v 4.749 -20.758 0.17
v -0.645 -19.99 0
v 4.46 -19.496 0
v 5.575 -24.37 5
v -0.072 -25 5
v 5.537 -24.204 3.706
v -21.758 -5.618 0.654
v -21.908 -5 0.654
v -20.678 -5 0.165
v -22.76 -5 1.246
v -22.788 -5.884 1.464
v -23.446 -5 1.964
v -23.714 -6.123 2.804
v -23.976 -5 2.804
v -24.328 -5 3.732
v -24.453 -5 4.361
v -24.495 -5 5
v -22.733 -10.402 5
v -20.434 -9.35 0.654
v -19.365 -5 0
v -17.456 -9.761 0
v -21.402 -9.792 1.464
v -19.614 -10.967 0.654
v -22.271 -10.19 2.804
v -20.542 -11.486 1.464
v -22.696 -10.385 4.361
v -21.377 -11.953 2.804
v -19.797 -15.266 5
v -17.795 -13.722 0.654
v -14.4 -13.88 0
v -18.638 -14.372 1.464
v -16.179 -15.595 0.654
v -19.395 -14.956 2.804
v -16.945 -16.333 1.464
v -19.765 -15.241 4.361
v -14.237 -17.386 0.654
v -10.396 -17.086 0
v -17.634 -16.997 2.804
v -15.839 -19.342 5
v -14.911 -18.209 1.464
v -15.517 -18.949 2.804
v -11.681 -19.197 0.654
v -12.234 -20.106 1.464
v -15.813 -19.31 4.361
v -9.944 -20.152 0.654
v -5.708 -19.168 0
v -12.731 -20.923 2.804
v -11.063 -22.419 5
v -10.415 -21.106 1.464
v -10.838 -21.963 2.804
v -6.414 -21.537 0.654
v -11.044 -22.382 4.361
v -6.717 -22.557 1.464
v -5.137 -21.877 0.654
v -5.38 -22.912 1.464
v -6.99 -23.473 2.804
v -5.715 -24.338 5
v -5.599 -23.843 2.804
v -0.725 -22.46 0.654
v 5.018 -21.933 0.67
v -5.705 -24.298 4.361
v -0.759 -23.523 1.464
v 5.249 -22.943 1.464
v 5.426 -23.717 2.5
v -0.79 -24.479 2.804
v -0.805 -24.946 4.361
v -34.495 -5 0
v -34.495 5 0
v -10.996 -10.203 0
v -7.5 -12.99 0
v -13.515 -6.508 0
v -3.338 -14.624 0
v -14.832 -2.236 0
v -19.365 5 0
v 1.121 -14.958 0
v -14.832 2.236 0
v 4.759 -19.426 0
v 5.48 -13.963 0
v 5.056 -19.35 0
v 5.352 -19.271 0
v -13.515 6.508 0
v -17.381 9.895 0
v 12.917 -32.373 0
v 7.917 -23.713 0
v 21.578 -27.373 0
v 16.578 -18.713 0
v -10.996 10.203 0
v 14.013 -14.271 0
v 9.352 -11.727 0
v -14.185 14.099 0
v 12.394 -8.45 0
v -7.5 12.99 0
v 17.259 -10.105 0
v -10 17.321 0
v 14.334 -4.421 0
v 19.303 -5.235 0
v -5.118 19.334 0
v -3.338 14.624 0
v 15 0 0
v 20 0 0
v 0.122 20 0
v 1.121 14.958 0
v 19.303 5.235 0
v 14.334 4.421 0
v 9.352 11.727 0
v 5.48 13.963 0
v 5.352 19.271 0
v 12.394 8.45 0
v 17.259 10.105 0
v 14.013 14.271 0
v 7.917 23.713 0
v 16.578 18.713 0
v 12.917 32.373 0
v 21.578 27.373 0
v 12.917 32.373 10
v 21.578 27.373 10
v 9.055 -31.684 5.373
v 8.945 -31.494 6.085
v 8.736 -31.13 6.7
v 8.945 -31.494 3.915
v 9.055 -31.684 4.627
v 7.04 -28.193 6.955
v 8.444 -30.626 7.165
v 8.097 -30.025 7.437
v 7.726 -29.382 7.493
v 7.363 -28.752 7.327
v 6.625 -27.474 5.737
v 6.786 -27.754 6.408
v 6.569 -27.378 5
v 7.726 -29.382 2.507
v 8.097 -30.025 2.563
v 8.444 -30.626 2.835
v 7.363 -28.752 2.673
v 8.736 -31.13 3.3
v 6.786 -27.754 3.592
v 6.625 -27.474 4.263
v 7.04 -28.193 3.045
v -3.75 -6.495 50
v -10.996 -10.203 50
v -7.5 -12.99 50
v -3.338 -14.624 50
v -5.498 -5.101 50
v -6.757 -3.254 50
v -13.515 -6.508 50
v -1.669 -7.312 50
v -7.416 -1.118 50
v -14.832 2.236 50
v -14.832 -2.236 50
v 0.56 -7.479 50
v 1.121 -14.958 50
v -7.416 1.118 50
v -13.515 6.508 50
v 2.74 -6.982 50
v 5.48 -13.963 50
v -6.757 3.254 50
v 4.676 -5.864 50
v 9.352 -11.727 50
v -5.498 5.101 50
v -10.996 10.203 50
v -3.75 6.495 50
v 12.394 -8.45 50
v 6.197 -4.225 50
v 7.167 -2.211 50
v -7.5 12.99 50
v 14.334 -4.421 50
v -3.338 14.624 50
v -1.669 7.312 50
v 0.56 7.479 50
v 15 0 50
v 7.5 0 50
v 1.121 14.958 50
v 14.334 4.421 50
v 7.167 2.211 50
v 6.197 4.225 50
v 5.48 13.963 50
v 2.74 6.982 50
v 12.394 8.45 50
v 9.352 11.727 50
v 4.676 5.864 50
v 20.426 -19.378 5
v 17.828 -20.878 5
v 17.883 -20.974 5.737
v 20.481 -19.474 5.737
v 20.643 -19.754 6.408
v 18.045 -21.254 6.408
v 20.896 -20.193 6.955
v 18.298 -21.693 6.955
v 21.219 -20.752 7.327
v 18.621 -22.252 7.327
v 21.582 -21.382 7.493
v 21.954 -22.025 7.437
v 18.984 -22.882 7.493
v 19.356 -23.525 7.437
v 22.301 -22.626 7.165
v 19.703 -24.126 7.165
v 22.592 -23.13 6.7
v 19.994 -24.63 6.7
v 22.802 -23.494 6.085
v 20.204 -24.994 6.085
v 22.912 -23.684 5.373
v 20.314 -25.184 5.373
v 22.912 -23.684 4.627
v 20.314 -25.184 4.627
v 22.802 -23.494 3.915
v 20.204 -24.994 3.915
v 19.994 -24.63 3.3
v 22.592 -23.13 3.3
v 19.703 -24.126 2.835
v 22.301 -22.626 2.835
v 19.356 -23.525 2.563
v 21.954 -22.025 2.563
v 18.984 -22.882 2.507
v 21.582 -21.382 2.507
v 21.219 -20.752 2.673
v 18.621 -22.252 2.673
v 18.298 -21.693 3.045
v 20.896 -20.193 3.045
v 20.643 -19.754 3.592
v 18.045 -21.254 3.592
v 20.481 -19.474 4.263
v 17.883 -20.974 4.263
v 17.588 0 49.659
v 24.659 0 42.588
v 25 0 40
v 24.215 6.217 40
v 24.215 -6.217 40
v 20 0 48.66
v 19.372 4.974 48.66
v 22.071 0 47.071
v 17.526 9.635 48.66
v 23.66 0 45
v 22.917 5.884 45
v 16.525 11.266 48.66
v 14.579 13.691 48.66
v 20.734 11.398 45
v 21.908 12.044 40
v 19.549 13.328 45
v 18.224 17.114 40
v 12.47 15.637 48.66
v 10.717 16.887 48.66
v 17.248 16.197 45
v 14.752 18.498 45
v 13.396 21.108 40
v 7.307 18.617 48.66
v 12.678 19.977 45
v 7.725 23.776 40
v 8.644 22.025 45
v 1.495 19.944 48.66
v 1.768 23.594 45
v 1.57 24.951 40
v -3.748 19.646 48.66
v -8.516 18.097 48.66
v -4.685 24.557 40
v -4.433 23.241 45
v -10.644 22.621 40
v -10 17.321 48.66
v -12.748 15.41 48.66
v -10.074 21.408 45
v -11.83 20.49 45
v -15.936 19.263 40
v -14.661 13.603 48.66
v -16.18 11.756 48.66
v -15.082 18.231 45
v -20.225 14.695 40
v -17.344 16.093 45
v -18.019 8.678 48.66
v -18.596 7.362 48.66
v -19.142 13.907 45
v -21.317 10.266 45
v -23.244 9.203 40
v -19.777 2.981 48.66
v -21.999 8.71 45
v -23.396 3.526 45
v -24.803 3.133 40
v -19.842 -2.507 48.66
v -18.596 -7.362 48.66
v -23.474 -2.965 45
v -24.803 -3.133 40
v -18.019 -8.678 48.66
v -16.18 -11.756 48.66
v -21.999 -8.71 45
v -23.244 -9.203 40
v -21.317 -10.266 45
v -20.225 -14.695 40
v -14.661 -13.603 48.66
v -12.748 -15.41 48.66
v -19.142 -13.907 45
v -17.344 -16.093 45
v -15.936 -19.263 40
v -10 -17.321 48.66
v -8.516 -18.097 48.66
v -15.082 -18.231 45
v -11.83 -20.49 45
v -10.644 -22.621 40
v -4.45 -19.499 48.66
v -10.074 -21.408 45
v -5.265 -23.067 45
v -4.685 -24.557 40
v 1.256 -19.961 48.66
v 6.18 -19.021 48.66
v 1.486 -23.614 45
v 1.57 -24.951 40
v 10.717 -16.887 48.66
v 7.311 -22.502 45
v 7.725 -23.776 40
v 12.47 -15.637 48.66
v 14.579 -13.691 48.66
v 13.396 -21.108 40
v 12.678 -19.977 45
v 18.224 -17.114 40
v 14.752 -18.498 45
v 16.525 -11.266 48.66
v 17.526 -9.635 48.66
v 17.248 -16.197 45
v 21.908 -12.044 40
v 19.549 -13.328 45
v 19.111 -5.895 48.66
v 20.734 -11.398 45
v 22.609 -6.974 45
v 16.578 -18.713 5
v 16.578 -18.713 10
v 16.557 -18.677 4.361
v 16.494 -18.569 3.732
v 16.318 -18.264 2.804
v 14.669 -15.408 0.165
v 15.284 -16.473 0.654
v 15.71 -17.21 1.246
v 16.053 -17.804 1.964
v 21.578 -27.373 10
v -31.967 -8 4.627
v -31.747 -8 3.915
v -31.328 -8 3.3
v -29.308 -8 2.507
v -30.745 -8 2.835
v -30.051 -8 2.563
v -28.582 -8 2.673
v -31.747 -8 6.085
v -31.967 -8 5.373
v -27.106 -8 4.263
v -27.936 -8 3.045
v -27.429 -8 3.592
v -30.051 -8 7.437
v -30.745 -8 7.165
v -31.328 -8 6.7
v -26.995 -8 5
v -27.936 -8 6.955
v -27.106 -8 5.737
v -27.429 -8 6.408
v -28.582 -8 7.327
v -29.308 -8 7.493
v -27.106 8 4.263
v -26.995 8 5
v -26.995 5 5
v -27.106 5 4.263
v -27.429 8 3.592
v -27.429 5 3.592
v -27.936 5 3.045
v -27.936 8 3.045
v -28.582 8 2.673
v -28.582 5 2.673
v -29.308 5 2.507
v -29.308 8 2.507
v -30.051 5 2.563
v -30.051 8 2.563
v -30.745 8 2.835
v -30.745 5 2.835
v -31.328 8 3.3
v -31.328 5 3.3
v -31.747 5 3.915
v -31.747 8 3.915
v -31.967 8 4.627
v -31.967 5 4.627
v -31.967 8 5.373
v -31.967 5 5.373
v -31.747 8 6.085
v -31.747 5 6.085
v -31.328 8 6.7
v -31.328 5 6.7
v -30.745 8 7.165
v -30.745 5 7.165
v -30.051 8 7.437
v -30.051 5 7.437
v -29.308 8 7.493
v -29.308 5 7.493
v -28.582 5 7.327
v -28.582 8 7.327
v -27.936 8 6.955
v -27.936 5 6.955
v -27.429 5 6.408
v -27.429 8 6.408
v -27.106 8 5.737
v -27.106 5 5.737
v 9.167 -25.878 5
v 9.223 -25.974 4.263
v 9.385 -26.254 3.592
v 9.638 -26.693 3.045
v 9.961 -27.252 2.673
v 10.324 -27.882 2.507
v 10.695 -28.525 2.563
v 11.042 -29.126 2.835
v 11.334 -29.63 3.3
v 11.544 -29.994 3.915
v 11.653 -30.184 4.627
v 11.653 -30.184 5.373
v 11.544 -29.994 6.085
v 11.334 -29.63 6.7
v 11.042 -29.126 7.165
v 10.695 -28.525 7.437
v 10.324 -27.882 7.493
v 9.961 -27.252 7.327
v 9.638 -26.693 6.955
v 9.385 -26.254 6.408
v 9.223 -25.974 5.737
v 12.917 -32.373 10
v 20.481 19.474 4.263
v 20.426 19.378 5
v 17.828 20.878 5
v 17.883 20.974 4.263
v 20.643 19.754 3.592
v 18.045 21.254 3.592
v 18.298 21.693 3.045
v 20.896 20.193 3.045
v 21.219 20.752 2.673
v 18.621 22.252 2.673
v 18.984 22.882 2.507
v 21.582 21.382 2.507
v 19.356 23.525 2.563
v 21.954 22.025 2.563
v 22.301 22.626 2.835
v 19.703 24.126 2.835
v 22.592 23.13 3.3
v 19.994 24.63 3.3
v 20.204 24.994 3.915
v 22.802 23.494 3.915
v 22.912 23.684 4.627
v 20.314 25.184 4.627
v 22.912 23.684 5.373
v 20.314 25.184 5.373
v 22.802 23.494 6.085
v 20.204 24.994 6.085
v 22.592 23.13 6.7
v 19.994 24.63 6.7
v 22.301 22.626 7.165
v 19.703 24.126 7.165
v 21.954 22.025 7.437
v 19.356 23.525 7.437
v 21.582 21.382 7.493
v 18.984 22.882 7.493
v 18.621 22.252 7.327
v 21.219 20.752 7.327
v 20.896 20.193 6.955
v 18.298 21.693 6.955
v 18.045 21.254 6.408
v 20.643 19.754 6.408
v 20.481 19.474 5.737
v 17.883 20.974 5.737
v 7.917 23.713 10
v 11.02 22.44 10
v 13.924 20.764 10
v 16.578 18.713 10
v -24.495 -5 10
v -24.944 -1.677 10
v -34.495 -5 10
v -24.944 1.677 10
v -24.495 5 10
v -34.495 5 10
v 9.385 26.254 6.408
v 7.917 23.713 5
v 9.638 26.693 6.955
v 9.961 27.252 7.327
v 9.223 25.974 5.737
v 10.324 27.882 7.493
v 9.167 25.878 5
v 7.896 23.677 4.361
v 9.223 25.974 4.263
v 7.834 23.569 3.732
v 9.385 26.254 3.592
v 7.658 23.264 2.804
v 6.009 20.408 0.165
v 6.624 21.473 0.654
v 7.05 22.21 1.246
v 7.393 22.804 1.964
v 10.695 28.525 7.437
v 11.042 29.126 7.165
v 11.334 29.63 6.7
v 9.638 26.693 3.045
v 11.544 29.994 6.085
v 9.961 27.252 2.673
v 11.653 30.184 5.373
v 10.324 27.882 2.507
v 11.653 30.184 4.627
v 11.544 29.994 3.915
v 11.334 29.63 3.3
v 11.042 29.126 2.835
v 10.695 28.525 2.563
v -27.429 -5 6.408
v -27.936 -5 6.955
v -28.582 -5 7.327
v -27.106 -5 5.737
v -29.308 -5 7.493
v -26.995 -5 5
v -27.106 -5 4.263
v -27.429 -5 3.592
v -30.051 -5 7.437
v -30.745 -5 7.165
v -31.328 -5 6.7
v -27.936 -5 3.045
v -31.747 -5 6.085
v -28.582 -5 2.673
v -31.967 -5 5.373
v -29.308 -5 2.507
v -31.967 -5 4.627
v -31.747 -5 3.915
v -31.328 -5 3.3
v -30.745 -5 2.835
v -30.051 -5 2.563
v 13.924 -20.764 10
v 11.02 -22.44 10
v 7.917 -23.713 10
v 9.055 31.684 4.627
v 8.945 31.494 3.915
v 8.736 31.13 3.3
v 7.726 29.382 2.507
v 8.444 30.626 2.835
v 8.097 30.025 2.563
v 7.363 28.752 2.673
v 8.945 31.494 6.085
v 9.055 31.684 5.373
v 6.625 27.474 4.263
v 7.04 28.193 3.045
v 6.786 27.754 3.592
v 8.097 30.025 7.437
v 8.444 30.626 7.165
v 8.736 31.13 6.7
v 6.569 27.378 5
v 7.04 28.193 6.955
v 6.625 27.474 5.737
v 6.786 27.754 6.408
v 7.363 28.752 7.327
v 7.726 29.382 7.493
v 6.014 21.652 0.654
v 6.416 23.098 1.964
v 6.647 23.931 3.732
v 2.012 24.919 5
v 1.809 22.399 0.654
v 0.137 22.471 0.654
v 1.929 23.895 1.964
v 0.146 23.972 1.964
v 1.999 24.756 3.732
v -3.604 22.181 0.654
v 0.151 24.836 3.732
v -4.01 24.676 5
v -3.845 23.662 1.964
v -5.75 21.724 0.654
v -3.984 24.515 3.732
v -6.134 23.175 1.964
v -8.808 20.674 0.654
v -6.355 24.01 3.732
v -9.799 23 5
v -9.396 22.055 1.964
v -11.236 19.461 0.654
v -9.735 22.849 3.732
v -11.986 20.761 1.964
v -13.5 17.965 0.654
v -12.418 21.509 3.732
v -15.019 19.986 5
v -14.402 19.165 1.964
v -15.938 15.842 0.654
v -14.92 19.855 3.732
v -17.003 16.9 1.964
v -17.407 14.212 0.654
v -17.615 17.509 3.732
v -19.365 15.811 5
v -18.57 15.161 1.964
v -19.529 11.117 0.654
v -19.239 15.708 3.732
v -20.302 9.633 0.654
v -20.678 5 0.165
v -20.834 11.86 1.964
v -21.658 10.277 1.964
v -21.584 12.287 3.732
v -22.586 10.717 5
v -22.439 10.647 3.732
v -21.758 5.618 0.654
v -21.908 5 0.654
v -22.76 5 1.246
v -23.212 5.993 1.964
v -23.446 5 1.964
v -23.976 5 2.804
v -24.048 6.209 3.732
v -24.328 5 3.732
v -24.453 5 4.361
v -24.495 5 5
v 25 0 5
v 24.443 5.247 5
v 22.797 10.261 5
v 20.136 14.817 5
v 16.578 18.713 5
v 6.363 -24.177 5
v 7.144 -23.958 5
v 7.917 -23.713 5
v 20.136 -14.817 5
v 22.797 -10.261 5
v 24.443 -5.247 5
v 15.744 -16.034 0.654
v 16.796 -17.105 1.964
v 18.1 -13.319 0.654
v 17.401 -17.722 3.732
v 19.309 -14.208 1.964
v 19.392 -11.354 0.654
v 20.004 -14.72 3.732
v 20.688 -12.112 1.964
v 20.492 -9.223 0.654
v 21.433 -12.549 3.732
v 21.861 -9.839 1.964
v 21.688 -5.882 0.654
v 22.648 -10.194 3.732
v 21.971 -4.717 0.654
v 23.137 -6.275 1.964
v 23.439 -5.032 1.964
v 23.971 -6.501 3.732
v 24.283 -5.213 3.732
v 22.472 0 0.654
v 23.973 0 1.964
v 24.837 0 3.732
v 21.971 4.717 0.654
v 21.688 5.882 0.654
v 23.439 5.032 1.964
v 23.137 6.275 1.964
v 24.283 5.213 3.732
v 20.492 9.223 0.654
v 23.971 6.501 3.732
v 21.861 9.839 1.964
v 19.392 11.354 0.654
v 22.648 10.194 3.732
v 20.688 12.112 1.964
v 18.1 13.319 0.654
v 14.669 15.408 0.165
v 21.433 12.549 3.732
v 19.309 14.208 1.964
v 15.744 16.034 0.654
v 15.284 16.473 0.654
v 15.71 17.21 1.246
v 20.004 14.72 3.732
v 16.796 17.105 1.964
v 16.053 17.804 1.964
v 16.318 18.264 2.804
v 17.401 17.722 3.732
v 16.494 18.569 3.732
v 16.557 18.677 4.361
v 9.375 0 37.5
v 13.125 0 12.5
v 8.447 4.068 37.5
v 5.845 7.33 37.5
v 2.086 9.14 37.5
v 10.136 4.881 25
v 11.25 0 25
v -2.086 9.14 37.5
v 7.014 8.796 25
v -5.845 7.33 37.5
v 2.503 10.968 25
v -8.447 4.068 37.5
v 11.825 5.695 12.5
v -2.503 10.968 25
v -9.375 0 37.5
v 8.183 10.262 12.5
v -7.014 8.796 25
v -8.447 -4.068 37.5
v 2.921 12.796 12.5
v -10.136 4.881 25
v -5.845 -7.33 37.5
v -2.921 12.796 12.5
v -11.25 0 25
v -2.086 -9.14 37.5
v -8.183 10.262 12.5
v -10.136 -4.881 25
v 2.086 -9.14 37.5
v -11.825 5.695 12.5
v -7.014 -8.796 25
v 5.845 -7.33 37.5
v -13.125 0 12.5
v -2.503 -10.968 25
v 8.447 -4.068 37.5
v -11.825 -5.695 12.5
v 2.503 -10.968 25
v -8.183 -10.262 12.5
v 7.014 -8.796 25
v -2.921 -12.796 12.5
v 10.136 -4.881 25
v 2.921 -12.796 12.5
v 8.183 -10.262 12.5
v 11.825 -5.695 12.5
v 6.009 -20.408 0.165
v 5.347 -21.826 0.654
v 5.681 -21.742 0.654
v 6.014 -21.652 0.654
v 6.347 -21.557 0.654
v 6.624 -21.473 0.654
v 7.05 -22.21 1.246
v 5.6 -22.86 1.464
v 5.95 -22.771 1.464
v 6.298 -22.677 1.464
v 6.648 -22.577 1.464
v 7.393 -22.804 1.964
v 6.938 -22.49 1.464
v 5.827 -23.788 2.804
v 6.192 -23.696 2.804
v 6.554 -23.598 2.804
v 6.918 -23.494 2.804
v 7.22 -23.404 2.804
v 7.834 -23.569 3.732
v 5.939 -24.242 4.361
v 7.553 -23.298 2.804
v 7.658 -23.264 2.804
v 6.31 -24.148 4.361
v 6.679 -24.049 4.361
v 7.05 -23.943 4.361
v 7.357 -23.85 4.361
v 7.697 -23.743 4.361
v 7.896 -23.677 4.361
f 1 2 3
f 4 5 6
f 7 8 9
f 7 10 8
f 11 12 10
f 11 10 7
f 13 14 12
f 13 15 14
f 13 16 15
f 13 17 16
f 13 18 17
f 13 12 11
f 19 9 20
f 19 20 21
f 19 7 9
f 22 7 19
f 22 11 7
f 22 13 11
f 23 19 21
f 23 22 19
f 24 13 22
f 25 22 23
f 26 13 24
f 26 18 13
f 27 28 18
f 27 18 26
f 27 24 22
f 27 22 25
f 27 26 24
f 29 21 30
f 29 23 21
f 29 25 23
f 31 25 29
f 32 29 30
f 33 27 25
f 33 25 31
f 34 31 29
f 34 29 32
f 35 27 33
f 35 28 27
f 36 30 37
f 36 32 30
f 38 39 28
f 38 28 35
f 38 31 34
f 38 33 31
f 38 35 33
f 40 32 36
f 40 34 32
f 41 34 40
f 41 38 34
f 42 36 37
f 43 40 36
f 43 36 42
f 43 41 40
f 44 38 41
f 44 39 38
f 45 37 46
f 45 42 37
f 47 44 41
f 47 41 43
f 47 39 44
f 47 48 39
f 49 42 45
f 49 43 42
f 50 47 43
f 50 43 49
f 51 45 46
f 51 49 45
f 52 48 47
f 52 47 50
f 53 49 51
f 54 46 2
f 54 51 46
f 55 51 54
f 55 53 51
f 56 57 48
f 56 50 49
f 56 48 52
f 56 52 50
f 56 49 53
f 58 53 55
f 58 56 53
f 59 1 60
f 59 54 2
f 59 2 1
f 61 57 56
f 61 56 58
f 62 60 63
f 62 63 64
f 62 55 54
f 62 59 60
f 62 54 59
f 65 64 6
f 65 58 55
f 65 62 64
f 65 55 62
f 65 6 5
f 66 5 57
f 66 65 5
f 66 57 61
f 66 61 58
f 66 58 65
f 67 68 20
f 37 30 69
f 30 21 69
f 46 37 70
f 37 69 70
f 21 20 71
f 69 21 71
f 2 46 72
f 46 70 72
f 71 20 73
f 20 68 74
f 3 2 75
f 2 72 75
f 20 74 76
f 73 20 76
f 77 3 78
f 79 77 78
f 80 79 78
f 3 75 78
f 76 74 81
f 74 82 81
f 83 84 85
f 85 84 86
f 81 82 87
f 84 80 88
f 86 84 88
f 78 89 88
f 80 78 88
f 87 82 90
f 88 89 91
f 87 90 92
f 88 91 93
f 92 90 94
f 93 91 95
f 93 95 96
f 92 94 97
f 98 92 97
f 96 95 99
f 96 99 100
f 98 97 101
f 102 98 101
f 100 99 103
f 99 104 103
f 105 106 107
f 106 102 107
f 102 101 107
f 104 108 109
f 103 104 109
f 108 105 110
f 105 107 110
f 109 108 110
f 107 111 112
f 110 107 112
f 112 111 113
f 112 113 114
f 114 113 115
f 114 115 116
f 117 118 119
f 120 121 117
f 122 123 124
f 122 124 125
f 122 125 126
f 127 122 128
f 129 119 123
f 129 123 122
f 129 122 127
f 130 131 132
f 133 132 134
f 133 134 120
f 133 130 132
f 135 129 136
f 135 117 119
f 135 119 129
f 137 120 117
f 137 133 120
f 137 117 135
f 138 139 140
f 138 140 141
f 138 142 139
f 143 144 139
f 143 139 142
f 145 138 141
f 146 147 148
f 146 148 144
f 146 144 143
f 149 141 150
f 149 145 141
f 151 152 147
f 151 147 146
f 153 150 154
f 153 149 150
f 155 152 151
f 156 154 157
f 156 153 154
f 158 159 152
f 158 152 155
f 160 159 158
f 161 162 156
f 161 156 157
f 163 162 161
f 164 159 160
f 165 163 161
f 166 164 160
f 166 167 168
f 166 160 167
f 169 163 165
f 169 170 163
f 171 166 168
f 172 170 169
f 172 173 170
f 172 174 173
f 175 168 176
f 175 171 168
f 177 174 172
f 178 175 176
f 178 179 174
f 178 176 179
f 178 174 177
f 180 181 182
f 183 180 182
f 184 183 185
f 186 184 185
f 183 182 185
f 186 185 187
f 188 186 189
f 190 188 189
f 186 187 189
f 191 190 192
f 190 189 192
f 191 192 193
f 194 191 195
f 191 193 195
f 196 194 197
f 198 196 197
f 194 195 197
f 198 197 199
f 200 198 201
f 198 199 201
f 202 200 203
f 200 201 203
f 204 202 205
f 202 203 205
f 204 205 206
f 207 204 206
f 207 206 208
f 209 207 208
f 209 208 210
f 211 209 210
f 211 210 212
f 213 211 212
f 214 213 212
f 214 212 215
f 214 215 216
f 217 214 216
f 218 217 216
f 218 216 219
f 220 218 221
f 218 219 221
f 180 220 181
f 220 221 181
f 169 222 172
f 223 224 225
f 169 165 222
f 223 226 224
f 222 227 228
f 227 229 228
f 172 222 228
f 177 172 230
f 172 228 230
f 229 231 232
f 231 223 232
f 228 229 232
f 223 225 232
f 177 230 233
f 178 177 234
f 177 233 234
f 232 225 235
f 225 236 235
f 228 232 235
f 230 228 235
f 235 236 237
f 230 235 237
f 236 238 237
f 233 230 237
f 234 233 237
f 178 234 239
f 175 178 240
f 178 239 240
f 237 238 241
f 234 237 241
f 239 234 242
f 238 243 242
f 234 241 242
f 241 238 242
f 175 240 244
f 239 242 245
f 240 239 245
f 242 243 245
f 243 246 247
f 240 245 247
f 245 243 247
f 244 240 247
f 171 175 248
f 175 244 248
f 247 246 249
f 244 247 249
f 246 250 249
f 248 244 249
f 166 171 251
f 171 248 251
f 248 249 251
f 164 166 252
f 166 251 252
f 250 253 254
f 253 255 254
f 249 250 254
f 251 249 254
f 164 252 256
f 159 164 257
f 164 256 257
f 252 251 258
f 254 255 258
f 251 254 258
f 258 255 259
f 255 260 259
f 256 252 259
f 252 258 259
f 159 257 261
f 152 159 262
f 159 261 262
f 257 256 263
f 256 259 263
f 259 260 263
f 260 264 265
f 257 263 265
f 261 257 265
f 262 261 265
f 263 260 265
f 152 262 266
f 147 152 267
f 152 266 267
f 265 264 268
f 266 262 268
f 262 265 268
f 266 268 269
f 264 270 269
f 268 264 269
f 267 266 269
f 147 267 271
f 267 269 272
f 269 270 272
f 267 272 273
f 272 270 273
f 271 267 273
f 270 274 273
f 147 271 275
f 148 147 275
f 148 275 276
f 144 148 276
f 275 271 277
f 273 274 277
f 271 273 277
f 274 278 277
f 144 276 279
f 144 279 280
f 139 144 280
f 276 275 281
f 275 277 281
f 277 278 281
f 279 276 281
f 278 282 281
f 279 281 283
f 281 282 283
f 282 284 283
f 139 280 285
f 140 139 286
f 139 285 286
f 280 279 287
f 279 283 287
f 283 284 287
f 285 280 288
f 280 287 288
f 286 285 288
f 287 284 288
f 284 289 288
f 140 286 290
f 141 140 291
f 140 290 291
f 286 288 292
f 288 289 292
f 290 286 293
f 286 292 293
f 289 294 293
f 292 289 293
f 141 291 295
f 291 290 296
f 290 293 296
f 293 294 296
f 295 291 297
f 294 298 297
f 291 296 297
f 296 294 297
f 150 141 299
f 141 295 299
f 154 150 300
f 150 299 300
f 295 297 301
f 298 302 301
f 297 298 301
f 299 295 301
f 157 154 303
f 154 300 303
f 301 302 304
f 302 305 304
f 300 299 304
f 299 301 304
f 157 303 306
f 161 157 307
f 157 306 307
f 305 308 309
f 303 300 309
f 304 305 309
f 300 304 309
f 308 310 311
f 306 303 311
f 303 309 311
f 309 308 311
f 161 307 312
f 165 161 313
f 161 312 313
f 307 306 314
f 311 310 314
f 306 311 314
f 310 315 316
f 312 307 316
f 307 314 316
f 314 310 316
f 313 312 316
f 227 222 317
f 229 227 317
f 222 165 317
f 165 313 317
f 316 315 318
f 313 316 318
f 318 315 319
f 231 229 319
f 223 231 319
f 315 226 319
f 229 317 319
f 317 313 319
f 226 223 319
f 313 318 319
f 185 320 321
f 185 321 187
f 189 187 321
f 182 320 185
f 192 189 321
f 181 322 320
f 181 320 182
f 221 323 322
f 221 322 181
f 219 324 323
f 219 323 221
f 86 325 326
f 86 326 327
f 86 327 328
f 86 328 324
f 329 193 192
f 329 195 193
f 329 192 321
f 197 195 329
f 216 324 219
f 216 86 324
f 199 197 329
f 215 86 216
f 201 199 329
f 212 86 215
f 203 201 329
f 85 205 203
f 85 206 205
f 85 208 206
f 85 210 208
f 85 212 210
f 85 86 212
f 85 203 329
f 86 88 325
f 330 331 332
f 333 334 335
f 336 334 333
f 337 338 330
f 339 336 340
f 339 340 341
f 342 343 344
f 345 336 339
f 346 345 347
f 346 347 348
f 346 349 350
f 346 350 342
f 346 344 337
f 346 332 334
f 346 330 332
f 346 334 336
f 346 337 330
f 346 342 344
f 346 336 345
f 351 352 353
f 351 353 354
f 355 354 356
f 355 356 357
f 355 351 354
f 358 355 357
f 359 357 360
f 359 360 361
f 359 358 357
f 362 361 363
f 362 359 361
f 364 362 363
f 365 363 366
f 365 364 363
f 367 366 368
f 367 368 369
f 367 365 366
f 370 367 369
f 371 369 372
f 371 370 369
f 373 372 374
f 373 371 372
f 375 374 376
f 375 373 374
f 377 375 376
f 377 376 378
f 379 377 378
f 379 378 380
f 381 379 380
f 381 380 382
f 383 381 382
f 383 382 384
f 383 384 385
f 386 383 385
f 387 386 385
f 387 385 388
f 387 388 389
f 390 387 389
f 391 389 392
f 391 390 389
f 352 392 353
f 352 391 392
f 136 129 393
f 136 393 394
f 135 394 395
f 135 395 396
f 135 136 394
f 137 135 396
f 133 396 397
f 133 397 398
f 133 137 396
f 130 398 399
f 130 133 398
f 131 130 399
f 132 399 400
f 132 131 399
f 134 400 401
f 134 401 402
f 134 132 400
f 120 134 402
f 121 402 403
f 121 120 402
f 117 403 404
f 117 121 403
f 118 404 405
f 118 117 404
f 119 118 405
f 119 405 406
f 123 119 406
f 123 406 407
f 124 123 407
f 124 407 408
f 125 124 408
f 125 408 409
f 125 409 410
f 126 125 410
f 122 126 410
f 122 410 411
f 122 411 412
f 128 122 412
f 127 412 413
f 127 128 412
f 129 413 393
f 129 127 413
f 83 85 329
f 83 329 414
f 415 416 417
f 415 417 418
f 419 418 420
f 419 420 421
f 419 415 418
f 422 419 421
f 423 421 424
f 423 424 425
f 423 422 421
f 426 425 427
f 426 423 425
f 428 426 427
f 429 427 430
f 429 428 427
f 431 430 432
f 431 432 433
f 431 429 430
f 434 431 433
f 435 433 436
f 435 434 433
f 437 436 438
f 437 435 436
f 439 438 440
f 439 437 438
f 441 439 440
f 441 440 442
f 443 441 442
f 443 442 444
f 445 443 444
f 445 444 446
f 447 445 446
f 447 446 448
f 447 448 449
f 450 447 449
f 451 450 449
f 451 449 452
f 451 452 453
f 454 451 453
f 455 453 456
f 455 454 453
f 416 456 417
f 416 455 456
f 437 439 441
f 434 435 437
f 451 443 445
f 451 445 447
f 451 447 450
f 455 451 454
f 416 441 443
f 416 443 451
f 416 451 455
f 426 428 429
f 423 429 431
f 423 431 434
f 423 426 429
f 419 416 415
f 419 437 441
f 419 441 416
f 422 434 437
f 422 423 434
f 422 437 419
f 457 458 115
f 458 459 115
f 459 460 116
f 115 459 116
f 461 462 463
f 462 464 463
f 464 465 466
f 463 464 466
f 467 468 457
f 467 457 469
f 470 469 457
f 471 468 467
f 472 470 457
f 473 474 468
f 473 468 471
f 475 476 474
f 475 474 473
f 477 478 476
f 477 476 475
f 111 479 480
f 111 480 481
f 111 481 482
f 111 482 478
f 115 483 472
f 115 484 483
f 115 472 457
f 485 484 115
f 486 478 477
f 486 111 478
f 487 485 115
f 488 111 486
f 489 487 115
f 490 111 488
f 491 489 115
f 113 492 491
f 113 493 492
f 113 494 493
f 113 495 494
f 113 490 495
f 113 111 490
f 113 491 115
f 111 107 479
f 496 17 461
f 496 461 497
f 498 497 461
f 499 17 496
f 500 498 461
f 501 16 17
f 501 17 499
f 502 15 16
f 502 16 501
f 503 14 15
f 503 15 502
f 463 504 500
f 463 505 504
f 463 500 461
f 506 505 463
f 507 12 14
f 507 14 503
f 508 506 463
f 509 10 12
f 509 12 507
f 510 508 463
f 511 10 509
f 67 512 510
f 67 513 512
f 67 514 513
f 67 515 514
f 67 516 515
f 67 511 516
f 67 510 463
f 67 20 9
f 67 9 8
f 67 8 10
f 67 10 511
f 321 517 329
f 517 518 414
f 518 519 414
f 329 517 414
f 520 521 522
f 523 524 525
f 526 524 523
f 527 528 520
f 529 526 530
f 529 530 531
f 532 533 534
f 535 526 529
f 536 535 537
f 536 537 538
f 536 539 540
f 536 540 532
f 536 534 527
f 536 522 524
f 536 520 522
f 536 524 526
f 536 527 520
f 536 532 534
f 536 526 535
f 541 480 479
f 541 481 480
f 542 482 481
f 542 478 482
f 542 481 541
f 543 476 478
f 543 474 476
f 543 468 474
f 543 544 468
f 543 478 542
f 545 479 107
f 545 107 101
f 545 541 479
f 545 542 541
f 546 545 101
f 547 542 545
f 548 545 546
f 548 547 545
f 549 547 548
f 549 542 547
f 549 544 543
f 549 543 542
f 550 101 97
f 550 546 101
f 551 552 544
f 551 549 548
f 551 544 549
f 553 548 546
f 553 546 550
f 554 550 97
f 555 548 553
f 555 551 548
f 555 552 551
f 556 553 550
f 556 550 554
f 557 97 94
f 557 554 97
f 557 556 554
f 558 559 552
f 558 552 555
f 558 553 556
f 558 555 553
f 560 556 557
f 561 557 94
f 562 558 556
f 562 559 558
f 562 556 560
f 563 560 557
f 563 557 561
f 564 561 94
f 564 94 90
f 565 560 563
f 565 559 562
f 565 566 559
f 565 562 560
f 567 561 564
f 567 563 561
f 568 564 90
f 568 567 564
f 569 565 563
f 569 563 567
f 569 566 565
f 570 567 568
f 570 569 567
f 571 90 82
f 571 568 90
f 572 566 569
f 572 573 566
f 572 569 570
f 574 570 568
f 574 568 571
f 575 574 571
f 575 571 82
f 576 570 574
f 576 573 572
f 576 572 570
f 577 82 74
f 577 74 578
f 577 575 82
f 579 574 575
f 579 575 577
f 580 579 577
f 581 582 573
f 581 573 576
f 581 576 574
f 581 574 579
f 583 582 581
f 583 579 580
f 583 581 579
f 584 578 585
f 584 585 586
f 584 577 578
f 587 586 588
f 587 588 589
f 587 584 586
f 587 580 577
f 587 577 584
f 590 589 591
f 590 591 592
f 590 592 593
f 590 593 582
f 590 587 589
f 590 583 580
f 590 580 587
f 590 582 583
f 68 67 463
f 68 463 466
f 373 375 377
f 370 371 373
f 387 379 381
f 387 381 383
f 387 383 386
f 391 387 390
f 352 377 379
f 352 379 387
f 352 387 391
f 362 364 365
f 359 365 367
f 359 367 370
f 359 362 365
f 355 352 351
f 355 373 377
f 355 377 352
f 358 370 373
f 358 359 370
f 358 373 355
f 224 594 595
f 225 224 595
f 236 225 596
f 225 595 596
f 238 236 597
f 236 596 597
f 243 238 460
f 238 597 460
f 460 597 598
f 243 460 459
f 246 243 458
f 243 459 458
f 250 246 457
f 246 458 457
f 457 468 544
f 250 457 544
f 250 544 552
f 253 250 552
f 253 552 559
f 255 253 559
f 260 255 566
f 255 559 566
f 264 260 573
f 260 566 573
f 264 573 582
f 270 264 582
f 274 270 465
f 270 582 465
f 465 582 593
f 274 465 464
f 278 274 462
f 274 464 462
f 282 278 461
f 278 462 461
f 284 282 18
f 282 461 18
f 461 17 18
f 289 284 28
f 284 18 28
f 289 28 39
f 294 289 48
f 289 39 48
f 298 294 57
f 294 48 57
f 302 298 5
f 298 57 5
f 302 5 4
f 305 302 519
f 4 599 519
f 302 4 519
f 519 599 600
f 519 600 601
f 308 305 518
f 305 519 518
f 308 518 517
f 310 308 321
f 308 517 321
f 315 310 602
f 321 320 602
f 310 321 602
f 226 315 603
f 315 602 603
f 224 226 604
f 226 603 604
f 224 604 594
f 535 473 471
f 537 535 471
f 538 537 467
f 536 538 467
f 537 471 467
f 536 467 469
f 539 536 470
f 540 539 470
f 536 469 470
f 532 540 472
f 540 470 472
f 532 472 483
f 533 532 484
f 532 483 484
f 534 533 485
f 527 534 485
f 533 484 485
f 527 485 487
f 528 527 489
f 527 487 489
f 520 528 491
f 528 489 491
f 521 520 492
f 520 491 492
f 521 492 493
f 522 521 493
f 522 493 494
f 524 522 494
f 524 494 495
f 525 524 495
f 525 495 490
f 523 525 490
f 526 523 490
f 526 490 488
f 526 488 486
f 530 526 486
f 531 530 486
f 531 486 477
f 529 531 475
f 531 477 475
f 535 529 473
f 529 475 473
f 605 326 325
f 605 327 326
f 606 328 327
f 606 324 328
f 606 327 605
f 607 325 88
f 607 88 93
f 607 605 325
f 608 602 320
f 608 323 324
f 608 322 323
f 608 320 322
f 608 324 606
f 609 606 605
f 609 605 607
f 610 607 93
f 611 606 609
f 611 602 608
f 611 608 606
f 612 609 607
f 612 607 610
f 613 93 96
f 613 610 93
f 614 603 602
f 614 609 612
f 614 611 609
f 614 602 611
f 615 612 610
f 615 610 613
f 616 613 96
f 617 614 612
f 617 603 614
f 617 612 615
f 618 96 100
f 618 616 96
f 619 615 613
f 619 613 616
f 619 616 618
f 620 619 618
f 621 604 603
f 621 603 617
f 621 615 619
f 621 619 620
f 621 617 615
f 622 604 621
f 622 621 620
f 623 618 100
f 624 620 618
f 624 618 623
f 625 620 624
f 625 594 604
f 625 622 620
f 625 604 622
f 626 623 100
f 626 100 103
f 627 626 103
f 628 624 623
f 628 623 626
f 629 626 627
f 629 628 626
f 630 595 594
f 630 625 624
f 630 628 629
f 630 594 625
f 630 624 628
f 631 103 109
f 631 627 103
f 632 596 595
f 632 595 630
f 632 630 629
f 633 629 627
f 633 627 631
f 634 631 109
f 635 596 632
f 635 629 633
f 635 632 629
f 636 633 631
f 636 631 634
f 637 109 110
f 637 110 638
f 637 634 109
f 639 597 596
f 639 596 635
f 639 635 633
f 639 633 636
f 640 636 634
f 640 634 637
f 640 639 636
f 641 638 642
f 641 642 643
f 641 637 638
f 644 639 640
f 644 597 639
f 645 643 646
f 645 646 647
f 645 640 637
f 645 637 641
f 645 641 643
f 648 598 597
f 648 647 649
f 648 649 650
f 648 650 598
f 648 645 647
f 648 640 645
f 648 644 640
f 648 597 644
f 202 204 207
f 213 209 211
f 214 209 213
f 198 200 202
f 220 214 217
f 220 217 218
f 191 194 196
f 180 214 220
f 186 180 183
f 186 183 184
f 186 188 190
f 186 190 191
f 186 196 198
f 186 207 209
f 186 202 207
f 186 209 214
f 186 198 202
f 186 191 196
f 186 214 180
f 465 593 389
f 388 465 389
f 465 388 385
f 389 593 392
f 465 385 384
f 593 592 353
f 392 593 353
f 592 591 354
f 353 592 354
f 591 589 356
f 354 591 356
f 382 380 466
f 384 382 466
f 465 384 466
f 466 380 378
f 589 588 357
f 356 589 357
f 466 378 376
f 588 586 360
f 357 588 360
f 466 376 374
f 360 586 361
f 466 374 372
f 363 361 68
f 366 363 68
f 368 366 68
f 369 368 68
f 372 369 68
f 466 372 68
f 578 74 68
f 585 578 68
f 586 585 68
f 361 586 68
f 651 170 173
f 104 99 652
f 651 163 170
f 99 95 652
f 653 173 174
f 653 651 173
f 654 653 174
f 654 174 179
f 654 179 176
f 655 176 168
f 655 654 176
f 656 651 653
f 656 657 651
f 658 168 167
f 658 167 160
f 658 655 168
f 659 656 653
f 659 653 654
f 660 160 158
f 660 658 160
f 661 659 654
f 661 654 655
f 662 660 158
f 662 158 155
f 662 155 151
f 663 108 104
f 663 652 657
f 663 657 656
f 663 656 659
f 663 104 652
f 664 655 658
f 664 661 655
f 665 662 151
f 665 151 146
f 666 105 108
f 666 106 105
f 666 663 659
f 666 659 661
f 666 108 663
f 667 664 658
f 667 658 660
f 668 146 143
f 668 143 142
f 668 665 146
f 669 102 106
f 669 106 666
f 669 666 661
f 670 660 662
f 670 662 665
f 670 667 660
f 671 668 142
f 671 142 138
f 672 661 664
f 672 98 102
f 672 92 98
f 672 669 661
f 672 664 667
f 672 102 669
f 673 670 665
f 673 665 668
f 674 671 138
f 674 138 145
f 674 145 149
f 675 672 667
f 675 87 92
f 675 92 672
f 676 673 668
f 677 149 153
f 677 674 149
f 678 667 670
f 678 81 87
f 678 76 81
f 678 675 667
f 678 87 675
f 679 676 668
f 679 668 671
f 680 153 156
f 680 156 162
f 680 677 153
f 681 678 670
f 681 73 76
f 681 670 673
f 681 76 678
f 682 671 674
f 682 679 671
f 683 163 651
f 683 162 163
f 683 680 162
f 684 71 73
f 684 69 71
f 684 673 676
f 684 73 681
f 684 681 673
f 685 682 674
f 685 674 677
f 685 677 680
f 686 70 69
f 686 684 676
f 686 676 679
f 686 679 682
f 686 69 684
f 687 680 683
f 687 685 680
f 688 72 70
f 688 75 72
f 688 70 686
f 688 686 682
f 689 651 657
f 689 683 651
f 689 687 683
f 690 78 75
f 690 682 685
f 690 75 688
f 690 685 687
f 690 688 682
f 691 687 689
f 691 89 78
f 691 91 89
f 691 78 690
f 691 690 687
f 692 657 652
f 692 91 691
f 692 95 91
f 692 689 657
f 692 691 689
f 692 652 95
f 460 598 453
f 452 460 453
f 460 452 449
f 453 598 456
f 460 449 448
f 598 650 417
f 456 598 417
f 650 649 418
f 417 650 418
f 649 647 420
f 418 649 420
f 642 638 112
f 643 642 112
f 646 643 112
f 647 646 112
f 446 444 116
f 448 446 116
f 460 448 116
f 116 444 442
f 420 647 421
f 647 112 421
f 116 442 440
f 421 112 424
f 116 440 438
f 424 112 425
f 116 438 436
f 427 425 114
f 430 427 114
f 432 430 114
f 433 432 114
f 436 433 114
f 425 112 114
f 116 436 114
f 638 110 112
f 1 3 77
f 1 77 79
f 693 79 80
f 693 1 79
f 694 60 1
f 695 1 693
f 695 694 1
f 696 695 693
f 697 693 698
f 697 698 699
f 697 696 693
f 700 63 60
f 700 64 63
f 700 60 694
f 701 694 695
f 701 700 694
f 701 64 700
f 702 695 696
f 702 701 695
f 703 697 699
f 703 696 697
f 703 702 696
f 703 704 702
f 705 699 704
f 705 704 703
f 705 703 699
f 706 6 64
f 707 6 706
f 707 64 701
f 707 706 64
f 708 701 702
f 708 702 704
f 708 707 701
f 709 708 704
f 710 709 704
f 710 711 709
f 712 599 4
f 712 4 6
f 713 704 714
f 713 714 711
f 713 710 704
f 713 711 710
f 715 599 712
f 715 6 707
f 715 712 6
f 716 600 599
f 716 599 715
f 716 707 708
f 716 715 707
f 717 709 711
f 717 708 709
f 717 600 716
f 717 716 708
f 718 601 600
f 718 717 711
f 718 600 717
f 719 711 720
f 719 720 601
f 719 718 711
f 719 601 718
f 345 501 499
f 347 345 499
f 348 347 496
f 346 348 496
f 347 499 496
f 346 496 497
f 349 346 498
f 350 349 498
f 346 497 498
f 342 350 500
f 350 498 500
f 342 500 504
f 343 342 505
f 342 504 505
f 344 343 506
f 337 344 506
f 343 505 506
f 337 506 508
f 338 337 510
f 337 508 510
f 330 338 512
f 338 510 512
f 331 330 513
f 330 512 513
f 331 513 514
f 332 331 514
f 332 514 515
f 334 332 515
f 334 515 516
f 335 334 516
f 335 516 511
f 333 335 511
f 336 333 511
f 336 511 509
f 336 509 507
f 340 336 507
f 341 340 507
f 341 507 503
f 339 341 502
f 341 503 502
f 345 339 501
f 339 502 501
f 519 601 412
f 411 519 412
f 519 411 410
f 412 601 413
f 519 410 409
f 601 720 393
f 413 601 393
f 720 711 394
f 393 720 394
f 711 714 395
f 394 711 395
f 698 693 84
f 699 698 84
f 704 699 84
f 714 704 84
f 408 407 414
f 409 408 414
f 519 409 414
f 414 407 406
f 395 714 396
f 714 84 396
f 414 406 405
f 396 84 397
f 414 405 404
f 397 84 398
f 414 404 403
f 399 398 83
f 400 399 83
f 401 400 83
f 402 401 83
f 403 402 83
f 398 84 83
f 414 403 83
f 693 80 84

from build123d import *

# Parameters (mm, degrees)
SKETCH1_R           = 25
BOSS_EXTRUDE1_DEPTH = 50
SKETCH2_W           = 10
SKETCH2_H           = 10
BOSS_EXTRUDE2_DEPTH = 10
SKETCH3_R           = 2.5
BOSS_EXTRUDE3_DEPTH = 3
BOSS_EXTRUDE4_START = 3
SKETCH4_R           = 2.5
BOSS_EXTRUDE4_DEPTH = 3
CIRPATTERN1_COUNT   = 3
SKETCH5_R           = 7.5
SKETCH6_R           = 15
FILLET1_R           = 10
FILLET2_R           = 5


with BuildPart() as part:
    # Sketch1 → Boss-Extrude1 (new body)
    with BuildSketch(Plane.XY):
        Circle(SKETCH1_R)
    extrude(amount=BOSS_EXTRUDE1_DEPTH)

    # Sketch2 → Boss-Extrude2 (add)
    with BuildSketch(Plane(origin=(0, 0, 0), x_dir=(-1, 0, 0), z_dir=(0, 0, -1))):
        with Locations((29.494897428, 0)):
            Rectangle(SKETCH2_W, SKETCH2_H)
    boss_extrude2 = extrude(amount=-BOSS_EXTRUDE2_DEPTH)

    # Sketch3 → Boss-Extrude3 (add)
    with BuildSketch(Plane.XZ.offset(5)):
        with Locations((-29.494897428, 5)):
            Circle(SKETCH3_R)
    boss_extrude3 = extrude(amount=BOSS_EXTRUDE3_DEPTH)

    # Sketch4 → Boss-Extrude4 (add)
    with BuildSketch(Plane(origin=(0, 5, 0), x_dir=(1, 0, 0), z_dir=(0, 1, 0)).offset(BOSS_EXTRUDE4_START)):
        with Locations((-29.494897428, -5)):
            Circle(SKETCH4_R)
    boss_extrude4 = extrude(amount=-BOSS_EXTRUDE4_DEPTH)

    # CirPattern1: Boss-Extrude2, Boss-Extrude3, Boss-Extrude4 ×3 about axis
    cirpattern1_axis = Axis((0, 0, 0), (0, 0, 1))
    add([boss_extrude2.rotate(cirpattern1_axis, i * 360 / CIRPATTERN1_COUNT) for i in range(1, CIRPATTERN1_COUNT)])
    add([boss_extrude3.rotate(cirpattern1_axis, i * 360 / CIRPATTERN1_COUNT) for i in range(1, CIRPATTERN1_COUNT)])
    add([boss_extrude4.rotate(cirpattern1_axis, i * 360 / CIRPATTERN1_COUNT) for i in range(1, CIRPATTERN1_COUNT)])

    # Sketch5 → Cut-Loft1 section 0
    with BuildSketch(Plane.XY.offset(50)):
        Circle(SKETCH5_R)
    # Sketch6 → Cut-Loft1 section 1
    with BuildSketch(Plane(origin=(0, 0, 0), x_dir=(-1, 0, 0), z_dir=(0, 0, -1))):
        Circle(SKETCH6_R)
    loft(mode=Mode.SUBTRACT)

    # Fillet1
    fillet1_edges = [part.edges().sort_by_distance(p)[0] for p in [
        (-25, 0, 50),
    ]]
    fillet(fillet1_edges, radius=FILLET1_R)

    # Fillet2
    # the kernel refuses this fillet: 5 mm, written as the material it takes off along each edge
    with BuildSketch(Plane(origin=(0, 0, 0), x_dir=(0.22300738877667003, -0.9748167543446364, 0), z_dir=(-0.9748167543446364, -0.22300738877667003, 0))) as fillet2_piece_1_section:
        with BuildLine():
            CenterArc((25 - FILLET2_R, FILLET2_R), FILLET2_R, 270, 90)
            Line((25 - FILLET2_R, 0), (25, 0))
            Line((25, 0), (25, FILLET2_R))
        make_face()
    fillet2_piece_1 = revolve(axis=Axis((0, 0, 0), (0, 0, 1)), revolution_arc=77.11426693, mode=Mode.PRIVATE)
    fillet2_piece_1 = split(fillet2_piece_1, bisect_by=Plane(origin=(7.29782447, -22.640202767, 1.23109977), z_dir=(-0.8660254037844394, -0.49999999999999883, 0)), keep=Keep.TOP, mode=Mode.PRIVATE)
    add(fillet2_piece_1, mode=Mode.SUBTRACT)
    with BuildSketch(Plane(origin=(0, 0, 0), x_dir=(0.22300738877667003, -0.9748167543446364, 0), z_dir=(-0.9748167543446364, -0.22300738877667003, 0))) as fillet2_piece_2_section:
        with BuildLine():
            CenterArc((25 - FILLET2_R, FILLET2_R), FILLET2_R, 270, 90)
            Line((25 - FILLET2_R, 0), (25, 0))
            Line((25, 0), (25, FILLET2_R))
        make_face()
    fillet2_piece_2 = revolve(axis=Axis((0, 0, 0), (0, 0, 1)), revolution_arc=77.11426693, mode=Mode.PRIVATE)
    fillet2_piece_2 = split(fillet2_piece_2, bisect_by=Plane(origin=(13.725987665, -13.77410802, 1.168109868), z_dir=(0.8660254037844394, 0.4999999999999987, 0)), keep=Keep.TOP, mode=Mode.PRIVATE)
    add(fillet2_piece_2, mode=Mode.SUBTRACT)
    with BuildSketch(Plane(origin=(0, 0, 0), x_dir=(0.732831285228025, 0.68041039629847, 0), z_dir=(0.68041039629847, -0.732831285228025, 0))) as fillet2_piece_3_section:
        with BuildLine():
            CenterArc((25 - FILLET2_R, FILLET2_R), FILLET2_R, 270, 90)
            Line((25 - FILLET2_R, 0), (25, 0))
            Line((25, 0), (25, FILLET2_R))
        make_face()
    fillet2_piece_3 = revolve(axis=Axis((0, 0, 0), (0, 0, 1)), revolution_arc=154.248557626, mode=Mode.PRIVATE)
    fillet2_piece_3 = split(fillet2_piece_3, bisect_by=Plane(origin=(15.957681681, 17.639515442, 1.230959753), z_dir=(0.8660254037844378, -0.5000000000000014, 0)), keep=Keep.TOP, mode=Mode.PRIVATE)
    add(fillet2_piece_3, mode=Mode.SUBTRACT)
    with BuildSketch(Plane(origin=(0, 0, 0), x_dir=(0.732831285228025, 0.68041039629847, 0), z_dir=(0.68041039629847, -0.732831285228025, 0))) as fillet2_piece_4_section:
        with BuildLine():
            CenterArc((25 - FILLET2_R, FILLET2_R), FILLET2_R, 270, 90)
            Line((25 - FILLET2_R, 0), (25, 0))
            Line((25, 0), (25, FILLET2_R))
        make_face()
    fillet2_piece_4 = revolve(axis=Axis((0, 0, 0), (0, 0, 1)), revolution_arc=154.248557626, mode=Mode.PRIVATE)
    fillet2_piece_4 = split(fillet2_piece_4, bisect_by=Plane(origin=(1.564958422, 12.710587499, 1.419658234), z_dir=(-0.8660254037844378, 0.5000000000000017, 0)), keep=Keep.TOP, mode=Mode.PRIVATE)
    fillet2_piece_4 = split(fillet2_piece_4, bisect_by=Plane(origin=(-11.790170883, 5, 1.419658234), z_dir=(0, 1, 0)), keep=Keep.TOP, mode=Mode.PRIVATE)
    add(fillet2_piece_4, mode=Mode.SUBTRACT)
    with BuildSketch(Plane(origin=(0, 0, 0), x_dir=(0.732831285228025, 0.68041039629847, 0), z_dir=(0.68041039629847, -0.732831285228025, 0))) as fillet2_piece_5_section:
        with BuildLine():
            CenterArc((25 - FILLET2_R, FILLET2_R), FILLET2_R, 270, 90)
            Line((25 - FILLET2_R, 0), (25, 0))
            Line((25, 0), (25, FILLET2_R))
        make_face()
    fillet2_piece_5 = revolve(axis=Axis((0, 0, 0), (0, 0, 1)), revolution_arc=154.248557626, mode=Mode.PRIVATE)
    fillet2_piece_5 = split(fillet2_piece_5, bisect_by=Plane(origin=(-23.255109262, -5, 1.230959847), z_dir=(0, -1, 0)), keep=Keep.TOP, mode=Mode.PRIVATE)
    add(fillet2_piece_5, mode=Mode.SUBTRACT)
    with BuildSketch(Plane(origin=(0, 0, 0), x_dir=(-0.9556683308075251, 0.29444531154623416, 0), z_dir=(0.29444531154623416, 0.9556683308075251, 0))) as fillet2_piece_6_section:
        with BuildLine():
            CenterArc((25 - FILLET2_R, FILLET2_R), FILLET2_R, 270, 90)
            Line((25 - FILLET2_R, 0), (25, 0))
            Line((25, 0), (25, FILLET2_R))
        make_face()
    fillet2_piece_6 = revolve(axis=Axis((0, 0, 0), (0, 0, 1)), revolution_arc=154.248557626, mode=Mode.PRIVATE)
    fillet2_piece_6 = split(fillet2_piece_6, bisect_by=Plane(origin=(-23.255109324, 5, 1.230959753), z_dir=(0, 1, 0)), keep=Keep.TOP, mode=Mode.PRIVATE)
    add(fillet2_piece_6, mode=Mode.SUBTRACT)
    with BuildSketch(Plane(origin=(0, 0, 0), x_dir=(-0.9556683308075251, 0.29444531154623416, 0), z_dir=(0.29444531154623416, 0.9556683308075251, 0))) as fillet2_piece_7_section:
        with BuildLine():
            CenterArc((25 - FILLET2_R, FILLET2_R), FILLET2_R, 270, 90)
            Line((25 - FILLET2_R, 0), (25, 0))
            Line((25, 0), (25, FILLET2_R))
        make_face()
    fillet2_piece_7 = revolve(axis=Axis((0, 0, 0), (0, 0, 1)), revolution_arc=154.248557626, mode=Mode.PRIVATE)
    fillet2_piece_7 = split(fillet2_piece_7, bisect_by=Plane(origin=(1.564958422, -12.710587499, 1.419658234), z_dir=(-0.8660254037844394, -0.49999999999999883, 0)), keep=Keep.TOP, mode=Mode.PRIVATE)
    fillet2_piece_7 = split(fillet2_piece_7, bisect_by=Plane(origin=(-11.790170883, -5, 1.419658234), z_dir=(0, -1, 0)), keep=Keep.TOP, mode=Mode.PRIVATE)
    add(fillet2_piece_7, mode=Mode.SUBTRACT)
    with BuildSketch(Plane(origin=(0, 0, 0), x_dir=(-0.9556683308075251, 0.29444531154623416, 0), z_dir=(0.29444531154623416, 0.9556683308075251, 0))) as fillet2_piece_8_section:
        with BuildLine():
            CenterArc((25 - FILLET2_R, FILLET2_R), FILLET2_R, 270, 90)
            Line((25 - FILLET2_R, 0), (25, 0))
            Line((25, 0), (25, FILLET2_R))
        make_face()
    fillet2_piece_8 = revolve(axis=Axis((0, 0, 0), (0, 0, 1)), revolution_arc=154.248557626, mode=Mode.PRIVATE)
    fillet2_piece_8 = split(fillet2_piece_8, bisect_by=Plane(origin=(15.95768165, -17.639515389, 1.230959847), z_dir=(0.8660254037844394, 0.4999999999999987, 0)), keep=Keep.TOP, mode=Mode.PRIVATE)
    add(fillet2_piece_8, mode=Mode.SUBTRACT)
    with BuildSketch(Plane(origin=(0, 0, 0), x_dir=(1, 0, 0), z_dir=(0, -1, 0))) as fillet2_piece_9_section:
        with BuildLine():
            CenterArc((25 - FILLET2_R, FILLET2_R), FILLET2_R, 270, 90)
            Line((25 - FILLET2_R, 0), (25, 0))
            Line((25, 0), (25, FILLET2_R))
        make_face()
    fillet2_piece_9 = revolve(axis=Axis((0, 0, 0), (0, 0, 1)), revolution_arc=77.11426693, mode=Mode.PRIVATE)
    fillet2_piece_9 = split(fillet2_piece_9, bisect_by=Plane(origin=(13.725987546, 13.774107814, 1.168109699), z_dir=(0.8660254037844378, -0.5000000000000014, 0)), keep=Keep.TOP, mode=Mode.PRIVATE)
    add(fillet2_piece_9, mode=Mode.SUBTRACT)
    with BuildSketch(Plane(origin=(0, 0, 0), x_dir=(1, 0, 0), z_dir=(0, -1, 0))) as fillet2_piece_10_section:
        with BuildLine():
            CenterArc((25 - FILLET2_R, FILLET2_R), FILLET2_R, 270, 90)
            Line((25 - FILLET2_R, 0), (25, 0))
            Line((25, 0), (25, FILLET2_R))
        make_face()
    fillet2_piece_10 = revolve(axis=Axis((0, 0, 0), (0, 0, 1)), revolution_arc=77.11426693, mode=Mode.PRIVATE)
    fillet2_piece_10 = split(fillet2_piece_10, bisect_by=Plane(origin=(7.297824439, 22.640202713, 1.231099864), z_dir=(-0.8660254037844378, 0.5000000000000017, 0)), keep=Keep.TOP, mode=Mode.PRIVATE)
    add(fillet2_piece_10, mode=Mode.SUBTRACT)


solid = part.part
